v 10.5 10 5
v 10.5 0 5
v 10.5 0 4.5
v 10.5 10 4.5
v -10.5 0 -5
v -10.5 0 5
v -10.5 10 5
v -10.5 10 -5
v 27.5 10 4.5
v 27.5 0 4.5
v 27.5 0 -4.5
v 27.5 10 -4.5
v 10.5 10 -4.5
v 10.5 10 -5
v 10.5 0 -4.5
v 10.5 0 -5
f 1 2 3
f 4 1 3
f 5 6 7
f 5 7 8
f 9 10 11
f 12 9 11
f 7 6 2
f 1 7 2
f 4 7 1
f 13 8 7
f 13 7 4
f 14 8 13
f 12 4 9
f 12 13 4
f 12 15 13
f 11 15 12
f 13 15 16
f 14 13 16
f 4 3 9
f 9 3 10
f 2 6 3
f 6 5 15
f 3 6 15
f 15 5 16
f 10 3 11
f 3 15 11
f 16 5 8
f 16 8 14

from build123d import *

# Parameters (mm, degrees)
SKETCH_1_W      = 21
SKETCH_1_H      = 10
SKETCH_1_W_2    = 17
SKETCH_1_H_2    = 9
EXTRUDE_1_DEPTH = 10


with BuildPart() as part:
    # 草图1 → 凸台-拉伸1 (new body)
    with BuildSketch(Plane(origin=(0, 0, 0), x_dir=(1, 0, 0), z_dir=(0, 1, 0))):
        Rectangle(SKETCH_1_W, SKETCH_1_H)
        with Locations((19, 0)):
            Rectangle(SKETCH_1_W_2, SKETCH_1_H_2)
    extrude(amount=EXTRUDE_1_DEPTH)


solid = part.part
